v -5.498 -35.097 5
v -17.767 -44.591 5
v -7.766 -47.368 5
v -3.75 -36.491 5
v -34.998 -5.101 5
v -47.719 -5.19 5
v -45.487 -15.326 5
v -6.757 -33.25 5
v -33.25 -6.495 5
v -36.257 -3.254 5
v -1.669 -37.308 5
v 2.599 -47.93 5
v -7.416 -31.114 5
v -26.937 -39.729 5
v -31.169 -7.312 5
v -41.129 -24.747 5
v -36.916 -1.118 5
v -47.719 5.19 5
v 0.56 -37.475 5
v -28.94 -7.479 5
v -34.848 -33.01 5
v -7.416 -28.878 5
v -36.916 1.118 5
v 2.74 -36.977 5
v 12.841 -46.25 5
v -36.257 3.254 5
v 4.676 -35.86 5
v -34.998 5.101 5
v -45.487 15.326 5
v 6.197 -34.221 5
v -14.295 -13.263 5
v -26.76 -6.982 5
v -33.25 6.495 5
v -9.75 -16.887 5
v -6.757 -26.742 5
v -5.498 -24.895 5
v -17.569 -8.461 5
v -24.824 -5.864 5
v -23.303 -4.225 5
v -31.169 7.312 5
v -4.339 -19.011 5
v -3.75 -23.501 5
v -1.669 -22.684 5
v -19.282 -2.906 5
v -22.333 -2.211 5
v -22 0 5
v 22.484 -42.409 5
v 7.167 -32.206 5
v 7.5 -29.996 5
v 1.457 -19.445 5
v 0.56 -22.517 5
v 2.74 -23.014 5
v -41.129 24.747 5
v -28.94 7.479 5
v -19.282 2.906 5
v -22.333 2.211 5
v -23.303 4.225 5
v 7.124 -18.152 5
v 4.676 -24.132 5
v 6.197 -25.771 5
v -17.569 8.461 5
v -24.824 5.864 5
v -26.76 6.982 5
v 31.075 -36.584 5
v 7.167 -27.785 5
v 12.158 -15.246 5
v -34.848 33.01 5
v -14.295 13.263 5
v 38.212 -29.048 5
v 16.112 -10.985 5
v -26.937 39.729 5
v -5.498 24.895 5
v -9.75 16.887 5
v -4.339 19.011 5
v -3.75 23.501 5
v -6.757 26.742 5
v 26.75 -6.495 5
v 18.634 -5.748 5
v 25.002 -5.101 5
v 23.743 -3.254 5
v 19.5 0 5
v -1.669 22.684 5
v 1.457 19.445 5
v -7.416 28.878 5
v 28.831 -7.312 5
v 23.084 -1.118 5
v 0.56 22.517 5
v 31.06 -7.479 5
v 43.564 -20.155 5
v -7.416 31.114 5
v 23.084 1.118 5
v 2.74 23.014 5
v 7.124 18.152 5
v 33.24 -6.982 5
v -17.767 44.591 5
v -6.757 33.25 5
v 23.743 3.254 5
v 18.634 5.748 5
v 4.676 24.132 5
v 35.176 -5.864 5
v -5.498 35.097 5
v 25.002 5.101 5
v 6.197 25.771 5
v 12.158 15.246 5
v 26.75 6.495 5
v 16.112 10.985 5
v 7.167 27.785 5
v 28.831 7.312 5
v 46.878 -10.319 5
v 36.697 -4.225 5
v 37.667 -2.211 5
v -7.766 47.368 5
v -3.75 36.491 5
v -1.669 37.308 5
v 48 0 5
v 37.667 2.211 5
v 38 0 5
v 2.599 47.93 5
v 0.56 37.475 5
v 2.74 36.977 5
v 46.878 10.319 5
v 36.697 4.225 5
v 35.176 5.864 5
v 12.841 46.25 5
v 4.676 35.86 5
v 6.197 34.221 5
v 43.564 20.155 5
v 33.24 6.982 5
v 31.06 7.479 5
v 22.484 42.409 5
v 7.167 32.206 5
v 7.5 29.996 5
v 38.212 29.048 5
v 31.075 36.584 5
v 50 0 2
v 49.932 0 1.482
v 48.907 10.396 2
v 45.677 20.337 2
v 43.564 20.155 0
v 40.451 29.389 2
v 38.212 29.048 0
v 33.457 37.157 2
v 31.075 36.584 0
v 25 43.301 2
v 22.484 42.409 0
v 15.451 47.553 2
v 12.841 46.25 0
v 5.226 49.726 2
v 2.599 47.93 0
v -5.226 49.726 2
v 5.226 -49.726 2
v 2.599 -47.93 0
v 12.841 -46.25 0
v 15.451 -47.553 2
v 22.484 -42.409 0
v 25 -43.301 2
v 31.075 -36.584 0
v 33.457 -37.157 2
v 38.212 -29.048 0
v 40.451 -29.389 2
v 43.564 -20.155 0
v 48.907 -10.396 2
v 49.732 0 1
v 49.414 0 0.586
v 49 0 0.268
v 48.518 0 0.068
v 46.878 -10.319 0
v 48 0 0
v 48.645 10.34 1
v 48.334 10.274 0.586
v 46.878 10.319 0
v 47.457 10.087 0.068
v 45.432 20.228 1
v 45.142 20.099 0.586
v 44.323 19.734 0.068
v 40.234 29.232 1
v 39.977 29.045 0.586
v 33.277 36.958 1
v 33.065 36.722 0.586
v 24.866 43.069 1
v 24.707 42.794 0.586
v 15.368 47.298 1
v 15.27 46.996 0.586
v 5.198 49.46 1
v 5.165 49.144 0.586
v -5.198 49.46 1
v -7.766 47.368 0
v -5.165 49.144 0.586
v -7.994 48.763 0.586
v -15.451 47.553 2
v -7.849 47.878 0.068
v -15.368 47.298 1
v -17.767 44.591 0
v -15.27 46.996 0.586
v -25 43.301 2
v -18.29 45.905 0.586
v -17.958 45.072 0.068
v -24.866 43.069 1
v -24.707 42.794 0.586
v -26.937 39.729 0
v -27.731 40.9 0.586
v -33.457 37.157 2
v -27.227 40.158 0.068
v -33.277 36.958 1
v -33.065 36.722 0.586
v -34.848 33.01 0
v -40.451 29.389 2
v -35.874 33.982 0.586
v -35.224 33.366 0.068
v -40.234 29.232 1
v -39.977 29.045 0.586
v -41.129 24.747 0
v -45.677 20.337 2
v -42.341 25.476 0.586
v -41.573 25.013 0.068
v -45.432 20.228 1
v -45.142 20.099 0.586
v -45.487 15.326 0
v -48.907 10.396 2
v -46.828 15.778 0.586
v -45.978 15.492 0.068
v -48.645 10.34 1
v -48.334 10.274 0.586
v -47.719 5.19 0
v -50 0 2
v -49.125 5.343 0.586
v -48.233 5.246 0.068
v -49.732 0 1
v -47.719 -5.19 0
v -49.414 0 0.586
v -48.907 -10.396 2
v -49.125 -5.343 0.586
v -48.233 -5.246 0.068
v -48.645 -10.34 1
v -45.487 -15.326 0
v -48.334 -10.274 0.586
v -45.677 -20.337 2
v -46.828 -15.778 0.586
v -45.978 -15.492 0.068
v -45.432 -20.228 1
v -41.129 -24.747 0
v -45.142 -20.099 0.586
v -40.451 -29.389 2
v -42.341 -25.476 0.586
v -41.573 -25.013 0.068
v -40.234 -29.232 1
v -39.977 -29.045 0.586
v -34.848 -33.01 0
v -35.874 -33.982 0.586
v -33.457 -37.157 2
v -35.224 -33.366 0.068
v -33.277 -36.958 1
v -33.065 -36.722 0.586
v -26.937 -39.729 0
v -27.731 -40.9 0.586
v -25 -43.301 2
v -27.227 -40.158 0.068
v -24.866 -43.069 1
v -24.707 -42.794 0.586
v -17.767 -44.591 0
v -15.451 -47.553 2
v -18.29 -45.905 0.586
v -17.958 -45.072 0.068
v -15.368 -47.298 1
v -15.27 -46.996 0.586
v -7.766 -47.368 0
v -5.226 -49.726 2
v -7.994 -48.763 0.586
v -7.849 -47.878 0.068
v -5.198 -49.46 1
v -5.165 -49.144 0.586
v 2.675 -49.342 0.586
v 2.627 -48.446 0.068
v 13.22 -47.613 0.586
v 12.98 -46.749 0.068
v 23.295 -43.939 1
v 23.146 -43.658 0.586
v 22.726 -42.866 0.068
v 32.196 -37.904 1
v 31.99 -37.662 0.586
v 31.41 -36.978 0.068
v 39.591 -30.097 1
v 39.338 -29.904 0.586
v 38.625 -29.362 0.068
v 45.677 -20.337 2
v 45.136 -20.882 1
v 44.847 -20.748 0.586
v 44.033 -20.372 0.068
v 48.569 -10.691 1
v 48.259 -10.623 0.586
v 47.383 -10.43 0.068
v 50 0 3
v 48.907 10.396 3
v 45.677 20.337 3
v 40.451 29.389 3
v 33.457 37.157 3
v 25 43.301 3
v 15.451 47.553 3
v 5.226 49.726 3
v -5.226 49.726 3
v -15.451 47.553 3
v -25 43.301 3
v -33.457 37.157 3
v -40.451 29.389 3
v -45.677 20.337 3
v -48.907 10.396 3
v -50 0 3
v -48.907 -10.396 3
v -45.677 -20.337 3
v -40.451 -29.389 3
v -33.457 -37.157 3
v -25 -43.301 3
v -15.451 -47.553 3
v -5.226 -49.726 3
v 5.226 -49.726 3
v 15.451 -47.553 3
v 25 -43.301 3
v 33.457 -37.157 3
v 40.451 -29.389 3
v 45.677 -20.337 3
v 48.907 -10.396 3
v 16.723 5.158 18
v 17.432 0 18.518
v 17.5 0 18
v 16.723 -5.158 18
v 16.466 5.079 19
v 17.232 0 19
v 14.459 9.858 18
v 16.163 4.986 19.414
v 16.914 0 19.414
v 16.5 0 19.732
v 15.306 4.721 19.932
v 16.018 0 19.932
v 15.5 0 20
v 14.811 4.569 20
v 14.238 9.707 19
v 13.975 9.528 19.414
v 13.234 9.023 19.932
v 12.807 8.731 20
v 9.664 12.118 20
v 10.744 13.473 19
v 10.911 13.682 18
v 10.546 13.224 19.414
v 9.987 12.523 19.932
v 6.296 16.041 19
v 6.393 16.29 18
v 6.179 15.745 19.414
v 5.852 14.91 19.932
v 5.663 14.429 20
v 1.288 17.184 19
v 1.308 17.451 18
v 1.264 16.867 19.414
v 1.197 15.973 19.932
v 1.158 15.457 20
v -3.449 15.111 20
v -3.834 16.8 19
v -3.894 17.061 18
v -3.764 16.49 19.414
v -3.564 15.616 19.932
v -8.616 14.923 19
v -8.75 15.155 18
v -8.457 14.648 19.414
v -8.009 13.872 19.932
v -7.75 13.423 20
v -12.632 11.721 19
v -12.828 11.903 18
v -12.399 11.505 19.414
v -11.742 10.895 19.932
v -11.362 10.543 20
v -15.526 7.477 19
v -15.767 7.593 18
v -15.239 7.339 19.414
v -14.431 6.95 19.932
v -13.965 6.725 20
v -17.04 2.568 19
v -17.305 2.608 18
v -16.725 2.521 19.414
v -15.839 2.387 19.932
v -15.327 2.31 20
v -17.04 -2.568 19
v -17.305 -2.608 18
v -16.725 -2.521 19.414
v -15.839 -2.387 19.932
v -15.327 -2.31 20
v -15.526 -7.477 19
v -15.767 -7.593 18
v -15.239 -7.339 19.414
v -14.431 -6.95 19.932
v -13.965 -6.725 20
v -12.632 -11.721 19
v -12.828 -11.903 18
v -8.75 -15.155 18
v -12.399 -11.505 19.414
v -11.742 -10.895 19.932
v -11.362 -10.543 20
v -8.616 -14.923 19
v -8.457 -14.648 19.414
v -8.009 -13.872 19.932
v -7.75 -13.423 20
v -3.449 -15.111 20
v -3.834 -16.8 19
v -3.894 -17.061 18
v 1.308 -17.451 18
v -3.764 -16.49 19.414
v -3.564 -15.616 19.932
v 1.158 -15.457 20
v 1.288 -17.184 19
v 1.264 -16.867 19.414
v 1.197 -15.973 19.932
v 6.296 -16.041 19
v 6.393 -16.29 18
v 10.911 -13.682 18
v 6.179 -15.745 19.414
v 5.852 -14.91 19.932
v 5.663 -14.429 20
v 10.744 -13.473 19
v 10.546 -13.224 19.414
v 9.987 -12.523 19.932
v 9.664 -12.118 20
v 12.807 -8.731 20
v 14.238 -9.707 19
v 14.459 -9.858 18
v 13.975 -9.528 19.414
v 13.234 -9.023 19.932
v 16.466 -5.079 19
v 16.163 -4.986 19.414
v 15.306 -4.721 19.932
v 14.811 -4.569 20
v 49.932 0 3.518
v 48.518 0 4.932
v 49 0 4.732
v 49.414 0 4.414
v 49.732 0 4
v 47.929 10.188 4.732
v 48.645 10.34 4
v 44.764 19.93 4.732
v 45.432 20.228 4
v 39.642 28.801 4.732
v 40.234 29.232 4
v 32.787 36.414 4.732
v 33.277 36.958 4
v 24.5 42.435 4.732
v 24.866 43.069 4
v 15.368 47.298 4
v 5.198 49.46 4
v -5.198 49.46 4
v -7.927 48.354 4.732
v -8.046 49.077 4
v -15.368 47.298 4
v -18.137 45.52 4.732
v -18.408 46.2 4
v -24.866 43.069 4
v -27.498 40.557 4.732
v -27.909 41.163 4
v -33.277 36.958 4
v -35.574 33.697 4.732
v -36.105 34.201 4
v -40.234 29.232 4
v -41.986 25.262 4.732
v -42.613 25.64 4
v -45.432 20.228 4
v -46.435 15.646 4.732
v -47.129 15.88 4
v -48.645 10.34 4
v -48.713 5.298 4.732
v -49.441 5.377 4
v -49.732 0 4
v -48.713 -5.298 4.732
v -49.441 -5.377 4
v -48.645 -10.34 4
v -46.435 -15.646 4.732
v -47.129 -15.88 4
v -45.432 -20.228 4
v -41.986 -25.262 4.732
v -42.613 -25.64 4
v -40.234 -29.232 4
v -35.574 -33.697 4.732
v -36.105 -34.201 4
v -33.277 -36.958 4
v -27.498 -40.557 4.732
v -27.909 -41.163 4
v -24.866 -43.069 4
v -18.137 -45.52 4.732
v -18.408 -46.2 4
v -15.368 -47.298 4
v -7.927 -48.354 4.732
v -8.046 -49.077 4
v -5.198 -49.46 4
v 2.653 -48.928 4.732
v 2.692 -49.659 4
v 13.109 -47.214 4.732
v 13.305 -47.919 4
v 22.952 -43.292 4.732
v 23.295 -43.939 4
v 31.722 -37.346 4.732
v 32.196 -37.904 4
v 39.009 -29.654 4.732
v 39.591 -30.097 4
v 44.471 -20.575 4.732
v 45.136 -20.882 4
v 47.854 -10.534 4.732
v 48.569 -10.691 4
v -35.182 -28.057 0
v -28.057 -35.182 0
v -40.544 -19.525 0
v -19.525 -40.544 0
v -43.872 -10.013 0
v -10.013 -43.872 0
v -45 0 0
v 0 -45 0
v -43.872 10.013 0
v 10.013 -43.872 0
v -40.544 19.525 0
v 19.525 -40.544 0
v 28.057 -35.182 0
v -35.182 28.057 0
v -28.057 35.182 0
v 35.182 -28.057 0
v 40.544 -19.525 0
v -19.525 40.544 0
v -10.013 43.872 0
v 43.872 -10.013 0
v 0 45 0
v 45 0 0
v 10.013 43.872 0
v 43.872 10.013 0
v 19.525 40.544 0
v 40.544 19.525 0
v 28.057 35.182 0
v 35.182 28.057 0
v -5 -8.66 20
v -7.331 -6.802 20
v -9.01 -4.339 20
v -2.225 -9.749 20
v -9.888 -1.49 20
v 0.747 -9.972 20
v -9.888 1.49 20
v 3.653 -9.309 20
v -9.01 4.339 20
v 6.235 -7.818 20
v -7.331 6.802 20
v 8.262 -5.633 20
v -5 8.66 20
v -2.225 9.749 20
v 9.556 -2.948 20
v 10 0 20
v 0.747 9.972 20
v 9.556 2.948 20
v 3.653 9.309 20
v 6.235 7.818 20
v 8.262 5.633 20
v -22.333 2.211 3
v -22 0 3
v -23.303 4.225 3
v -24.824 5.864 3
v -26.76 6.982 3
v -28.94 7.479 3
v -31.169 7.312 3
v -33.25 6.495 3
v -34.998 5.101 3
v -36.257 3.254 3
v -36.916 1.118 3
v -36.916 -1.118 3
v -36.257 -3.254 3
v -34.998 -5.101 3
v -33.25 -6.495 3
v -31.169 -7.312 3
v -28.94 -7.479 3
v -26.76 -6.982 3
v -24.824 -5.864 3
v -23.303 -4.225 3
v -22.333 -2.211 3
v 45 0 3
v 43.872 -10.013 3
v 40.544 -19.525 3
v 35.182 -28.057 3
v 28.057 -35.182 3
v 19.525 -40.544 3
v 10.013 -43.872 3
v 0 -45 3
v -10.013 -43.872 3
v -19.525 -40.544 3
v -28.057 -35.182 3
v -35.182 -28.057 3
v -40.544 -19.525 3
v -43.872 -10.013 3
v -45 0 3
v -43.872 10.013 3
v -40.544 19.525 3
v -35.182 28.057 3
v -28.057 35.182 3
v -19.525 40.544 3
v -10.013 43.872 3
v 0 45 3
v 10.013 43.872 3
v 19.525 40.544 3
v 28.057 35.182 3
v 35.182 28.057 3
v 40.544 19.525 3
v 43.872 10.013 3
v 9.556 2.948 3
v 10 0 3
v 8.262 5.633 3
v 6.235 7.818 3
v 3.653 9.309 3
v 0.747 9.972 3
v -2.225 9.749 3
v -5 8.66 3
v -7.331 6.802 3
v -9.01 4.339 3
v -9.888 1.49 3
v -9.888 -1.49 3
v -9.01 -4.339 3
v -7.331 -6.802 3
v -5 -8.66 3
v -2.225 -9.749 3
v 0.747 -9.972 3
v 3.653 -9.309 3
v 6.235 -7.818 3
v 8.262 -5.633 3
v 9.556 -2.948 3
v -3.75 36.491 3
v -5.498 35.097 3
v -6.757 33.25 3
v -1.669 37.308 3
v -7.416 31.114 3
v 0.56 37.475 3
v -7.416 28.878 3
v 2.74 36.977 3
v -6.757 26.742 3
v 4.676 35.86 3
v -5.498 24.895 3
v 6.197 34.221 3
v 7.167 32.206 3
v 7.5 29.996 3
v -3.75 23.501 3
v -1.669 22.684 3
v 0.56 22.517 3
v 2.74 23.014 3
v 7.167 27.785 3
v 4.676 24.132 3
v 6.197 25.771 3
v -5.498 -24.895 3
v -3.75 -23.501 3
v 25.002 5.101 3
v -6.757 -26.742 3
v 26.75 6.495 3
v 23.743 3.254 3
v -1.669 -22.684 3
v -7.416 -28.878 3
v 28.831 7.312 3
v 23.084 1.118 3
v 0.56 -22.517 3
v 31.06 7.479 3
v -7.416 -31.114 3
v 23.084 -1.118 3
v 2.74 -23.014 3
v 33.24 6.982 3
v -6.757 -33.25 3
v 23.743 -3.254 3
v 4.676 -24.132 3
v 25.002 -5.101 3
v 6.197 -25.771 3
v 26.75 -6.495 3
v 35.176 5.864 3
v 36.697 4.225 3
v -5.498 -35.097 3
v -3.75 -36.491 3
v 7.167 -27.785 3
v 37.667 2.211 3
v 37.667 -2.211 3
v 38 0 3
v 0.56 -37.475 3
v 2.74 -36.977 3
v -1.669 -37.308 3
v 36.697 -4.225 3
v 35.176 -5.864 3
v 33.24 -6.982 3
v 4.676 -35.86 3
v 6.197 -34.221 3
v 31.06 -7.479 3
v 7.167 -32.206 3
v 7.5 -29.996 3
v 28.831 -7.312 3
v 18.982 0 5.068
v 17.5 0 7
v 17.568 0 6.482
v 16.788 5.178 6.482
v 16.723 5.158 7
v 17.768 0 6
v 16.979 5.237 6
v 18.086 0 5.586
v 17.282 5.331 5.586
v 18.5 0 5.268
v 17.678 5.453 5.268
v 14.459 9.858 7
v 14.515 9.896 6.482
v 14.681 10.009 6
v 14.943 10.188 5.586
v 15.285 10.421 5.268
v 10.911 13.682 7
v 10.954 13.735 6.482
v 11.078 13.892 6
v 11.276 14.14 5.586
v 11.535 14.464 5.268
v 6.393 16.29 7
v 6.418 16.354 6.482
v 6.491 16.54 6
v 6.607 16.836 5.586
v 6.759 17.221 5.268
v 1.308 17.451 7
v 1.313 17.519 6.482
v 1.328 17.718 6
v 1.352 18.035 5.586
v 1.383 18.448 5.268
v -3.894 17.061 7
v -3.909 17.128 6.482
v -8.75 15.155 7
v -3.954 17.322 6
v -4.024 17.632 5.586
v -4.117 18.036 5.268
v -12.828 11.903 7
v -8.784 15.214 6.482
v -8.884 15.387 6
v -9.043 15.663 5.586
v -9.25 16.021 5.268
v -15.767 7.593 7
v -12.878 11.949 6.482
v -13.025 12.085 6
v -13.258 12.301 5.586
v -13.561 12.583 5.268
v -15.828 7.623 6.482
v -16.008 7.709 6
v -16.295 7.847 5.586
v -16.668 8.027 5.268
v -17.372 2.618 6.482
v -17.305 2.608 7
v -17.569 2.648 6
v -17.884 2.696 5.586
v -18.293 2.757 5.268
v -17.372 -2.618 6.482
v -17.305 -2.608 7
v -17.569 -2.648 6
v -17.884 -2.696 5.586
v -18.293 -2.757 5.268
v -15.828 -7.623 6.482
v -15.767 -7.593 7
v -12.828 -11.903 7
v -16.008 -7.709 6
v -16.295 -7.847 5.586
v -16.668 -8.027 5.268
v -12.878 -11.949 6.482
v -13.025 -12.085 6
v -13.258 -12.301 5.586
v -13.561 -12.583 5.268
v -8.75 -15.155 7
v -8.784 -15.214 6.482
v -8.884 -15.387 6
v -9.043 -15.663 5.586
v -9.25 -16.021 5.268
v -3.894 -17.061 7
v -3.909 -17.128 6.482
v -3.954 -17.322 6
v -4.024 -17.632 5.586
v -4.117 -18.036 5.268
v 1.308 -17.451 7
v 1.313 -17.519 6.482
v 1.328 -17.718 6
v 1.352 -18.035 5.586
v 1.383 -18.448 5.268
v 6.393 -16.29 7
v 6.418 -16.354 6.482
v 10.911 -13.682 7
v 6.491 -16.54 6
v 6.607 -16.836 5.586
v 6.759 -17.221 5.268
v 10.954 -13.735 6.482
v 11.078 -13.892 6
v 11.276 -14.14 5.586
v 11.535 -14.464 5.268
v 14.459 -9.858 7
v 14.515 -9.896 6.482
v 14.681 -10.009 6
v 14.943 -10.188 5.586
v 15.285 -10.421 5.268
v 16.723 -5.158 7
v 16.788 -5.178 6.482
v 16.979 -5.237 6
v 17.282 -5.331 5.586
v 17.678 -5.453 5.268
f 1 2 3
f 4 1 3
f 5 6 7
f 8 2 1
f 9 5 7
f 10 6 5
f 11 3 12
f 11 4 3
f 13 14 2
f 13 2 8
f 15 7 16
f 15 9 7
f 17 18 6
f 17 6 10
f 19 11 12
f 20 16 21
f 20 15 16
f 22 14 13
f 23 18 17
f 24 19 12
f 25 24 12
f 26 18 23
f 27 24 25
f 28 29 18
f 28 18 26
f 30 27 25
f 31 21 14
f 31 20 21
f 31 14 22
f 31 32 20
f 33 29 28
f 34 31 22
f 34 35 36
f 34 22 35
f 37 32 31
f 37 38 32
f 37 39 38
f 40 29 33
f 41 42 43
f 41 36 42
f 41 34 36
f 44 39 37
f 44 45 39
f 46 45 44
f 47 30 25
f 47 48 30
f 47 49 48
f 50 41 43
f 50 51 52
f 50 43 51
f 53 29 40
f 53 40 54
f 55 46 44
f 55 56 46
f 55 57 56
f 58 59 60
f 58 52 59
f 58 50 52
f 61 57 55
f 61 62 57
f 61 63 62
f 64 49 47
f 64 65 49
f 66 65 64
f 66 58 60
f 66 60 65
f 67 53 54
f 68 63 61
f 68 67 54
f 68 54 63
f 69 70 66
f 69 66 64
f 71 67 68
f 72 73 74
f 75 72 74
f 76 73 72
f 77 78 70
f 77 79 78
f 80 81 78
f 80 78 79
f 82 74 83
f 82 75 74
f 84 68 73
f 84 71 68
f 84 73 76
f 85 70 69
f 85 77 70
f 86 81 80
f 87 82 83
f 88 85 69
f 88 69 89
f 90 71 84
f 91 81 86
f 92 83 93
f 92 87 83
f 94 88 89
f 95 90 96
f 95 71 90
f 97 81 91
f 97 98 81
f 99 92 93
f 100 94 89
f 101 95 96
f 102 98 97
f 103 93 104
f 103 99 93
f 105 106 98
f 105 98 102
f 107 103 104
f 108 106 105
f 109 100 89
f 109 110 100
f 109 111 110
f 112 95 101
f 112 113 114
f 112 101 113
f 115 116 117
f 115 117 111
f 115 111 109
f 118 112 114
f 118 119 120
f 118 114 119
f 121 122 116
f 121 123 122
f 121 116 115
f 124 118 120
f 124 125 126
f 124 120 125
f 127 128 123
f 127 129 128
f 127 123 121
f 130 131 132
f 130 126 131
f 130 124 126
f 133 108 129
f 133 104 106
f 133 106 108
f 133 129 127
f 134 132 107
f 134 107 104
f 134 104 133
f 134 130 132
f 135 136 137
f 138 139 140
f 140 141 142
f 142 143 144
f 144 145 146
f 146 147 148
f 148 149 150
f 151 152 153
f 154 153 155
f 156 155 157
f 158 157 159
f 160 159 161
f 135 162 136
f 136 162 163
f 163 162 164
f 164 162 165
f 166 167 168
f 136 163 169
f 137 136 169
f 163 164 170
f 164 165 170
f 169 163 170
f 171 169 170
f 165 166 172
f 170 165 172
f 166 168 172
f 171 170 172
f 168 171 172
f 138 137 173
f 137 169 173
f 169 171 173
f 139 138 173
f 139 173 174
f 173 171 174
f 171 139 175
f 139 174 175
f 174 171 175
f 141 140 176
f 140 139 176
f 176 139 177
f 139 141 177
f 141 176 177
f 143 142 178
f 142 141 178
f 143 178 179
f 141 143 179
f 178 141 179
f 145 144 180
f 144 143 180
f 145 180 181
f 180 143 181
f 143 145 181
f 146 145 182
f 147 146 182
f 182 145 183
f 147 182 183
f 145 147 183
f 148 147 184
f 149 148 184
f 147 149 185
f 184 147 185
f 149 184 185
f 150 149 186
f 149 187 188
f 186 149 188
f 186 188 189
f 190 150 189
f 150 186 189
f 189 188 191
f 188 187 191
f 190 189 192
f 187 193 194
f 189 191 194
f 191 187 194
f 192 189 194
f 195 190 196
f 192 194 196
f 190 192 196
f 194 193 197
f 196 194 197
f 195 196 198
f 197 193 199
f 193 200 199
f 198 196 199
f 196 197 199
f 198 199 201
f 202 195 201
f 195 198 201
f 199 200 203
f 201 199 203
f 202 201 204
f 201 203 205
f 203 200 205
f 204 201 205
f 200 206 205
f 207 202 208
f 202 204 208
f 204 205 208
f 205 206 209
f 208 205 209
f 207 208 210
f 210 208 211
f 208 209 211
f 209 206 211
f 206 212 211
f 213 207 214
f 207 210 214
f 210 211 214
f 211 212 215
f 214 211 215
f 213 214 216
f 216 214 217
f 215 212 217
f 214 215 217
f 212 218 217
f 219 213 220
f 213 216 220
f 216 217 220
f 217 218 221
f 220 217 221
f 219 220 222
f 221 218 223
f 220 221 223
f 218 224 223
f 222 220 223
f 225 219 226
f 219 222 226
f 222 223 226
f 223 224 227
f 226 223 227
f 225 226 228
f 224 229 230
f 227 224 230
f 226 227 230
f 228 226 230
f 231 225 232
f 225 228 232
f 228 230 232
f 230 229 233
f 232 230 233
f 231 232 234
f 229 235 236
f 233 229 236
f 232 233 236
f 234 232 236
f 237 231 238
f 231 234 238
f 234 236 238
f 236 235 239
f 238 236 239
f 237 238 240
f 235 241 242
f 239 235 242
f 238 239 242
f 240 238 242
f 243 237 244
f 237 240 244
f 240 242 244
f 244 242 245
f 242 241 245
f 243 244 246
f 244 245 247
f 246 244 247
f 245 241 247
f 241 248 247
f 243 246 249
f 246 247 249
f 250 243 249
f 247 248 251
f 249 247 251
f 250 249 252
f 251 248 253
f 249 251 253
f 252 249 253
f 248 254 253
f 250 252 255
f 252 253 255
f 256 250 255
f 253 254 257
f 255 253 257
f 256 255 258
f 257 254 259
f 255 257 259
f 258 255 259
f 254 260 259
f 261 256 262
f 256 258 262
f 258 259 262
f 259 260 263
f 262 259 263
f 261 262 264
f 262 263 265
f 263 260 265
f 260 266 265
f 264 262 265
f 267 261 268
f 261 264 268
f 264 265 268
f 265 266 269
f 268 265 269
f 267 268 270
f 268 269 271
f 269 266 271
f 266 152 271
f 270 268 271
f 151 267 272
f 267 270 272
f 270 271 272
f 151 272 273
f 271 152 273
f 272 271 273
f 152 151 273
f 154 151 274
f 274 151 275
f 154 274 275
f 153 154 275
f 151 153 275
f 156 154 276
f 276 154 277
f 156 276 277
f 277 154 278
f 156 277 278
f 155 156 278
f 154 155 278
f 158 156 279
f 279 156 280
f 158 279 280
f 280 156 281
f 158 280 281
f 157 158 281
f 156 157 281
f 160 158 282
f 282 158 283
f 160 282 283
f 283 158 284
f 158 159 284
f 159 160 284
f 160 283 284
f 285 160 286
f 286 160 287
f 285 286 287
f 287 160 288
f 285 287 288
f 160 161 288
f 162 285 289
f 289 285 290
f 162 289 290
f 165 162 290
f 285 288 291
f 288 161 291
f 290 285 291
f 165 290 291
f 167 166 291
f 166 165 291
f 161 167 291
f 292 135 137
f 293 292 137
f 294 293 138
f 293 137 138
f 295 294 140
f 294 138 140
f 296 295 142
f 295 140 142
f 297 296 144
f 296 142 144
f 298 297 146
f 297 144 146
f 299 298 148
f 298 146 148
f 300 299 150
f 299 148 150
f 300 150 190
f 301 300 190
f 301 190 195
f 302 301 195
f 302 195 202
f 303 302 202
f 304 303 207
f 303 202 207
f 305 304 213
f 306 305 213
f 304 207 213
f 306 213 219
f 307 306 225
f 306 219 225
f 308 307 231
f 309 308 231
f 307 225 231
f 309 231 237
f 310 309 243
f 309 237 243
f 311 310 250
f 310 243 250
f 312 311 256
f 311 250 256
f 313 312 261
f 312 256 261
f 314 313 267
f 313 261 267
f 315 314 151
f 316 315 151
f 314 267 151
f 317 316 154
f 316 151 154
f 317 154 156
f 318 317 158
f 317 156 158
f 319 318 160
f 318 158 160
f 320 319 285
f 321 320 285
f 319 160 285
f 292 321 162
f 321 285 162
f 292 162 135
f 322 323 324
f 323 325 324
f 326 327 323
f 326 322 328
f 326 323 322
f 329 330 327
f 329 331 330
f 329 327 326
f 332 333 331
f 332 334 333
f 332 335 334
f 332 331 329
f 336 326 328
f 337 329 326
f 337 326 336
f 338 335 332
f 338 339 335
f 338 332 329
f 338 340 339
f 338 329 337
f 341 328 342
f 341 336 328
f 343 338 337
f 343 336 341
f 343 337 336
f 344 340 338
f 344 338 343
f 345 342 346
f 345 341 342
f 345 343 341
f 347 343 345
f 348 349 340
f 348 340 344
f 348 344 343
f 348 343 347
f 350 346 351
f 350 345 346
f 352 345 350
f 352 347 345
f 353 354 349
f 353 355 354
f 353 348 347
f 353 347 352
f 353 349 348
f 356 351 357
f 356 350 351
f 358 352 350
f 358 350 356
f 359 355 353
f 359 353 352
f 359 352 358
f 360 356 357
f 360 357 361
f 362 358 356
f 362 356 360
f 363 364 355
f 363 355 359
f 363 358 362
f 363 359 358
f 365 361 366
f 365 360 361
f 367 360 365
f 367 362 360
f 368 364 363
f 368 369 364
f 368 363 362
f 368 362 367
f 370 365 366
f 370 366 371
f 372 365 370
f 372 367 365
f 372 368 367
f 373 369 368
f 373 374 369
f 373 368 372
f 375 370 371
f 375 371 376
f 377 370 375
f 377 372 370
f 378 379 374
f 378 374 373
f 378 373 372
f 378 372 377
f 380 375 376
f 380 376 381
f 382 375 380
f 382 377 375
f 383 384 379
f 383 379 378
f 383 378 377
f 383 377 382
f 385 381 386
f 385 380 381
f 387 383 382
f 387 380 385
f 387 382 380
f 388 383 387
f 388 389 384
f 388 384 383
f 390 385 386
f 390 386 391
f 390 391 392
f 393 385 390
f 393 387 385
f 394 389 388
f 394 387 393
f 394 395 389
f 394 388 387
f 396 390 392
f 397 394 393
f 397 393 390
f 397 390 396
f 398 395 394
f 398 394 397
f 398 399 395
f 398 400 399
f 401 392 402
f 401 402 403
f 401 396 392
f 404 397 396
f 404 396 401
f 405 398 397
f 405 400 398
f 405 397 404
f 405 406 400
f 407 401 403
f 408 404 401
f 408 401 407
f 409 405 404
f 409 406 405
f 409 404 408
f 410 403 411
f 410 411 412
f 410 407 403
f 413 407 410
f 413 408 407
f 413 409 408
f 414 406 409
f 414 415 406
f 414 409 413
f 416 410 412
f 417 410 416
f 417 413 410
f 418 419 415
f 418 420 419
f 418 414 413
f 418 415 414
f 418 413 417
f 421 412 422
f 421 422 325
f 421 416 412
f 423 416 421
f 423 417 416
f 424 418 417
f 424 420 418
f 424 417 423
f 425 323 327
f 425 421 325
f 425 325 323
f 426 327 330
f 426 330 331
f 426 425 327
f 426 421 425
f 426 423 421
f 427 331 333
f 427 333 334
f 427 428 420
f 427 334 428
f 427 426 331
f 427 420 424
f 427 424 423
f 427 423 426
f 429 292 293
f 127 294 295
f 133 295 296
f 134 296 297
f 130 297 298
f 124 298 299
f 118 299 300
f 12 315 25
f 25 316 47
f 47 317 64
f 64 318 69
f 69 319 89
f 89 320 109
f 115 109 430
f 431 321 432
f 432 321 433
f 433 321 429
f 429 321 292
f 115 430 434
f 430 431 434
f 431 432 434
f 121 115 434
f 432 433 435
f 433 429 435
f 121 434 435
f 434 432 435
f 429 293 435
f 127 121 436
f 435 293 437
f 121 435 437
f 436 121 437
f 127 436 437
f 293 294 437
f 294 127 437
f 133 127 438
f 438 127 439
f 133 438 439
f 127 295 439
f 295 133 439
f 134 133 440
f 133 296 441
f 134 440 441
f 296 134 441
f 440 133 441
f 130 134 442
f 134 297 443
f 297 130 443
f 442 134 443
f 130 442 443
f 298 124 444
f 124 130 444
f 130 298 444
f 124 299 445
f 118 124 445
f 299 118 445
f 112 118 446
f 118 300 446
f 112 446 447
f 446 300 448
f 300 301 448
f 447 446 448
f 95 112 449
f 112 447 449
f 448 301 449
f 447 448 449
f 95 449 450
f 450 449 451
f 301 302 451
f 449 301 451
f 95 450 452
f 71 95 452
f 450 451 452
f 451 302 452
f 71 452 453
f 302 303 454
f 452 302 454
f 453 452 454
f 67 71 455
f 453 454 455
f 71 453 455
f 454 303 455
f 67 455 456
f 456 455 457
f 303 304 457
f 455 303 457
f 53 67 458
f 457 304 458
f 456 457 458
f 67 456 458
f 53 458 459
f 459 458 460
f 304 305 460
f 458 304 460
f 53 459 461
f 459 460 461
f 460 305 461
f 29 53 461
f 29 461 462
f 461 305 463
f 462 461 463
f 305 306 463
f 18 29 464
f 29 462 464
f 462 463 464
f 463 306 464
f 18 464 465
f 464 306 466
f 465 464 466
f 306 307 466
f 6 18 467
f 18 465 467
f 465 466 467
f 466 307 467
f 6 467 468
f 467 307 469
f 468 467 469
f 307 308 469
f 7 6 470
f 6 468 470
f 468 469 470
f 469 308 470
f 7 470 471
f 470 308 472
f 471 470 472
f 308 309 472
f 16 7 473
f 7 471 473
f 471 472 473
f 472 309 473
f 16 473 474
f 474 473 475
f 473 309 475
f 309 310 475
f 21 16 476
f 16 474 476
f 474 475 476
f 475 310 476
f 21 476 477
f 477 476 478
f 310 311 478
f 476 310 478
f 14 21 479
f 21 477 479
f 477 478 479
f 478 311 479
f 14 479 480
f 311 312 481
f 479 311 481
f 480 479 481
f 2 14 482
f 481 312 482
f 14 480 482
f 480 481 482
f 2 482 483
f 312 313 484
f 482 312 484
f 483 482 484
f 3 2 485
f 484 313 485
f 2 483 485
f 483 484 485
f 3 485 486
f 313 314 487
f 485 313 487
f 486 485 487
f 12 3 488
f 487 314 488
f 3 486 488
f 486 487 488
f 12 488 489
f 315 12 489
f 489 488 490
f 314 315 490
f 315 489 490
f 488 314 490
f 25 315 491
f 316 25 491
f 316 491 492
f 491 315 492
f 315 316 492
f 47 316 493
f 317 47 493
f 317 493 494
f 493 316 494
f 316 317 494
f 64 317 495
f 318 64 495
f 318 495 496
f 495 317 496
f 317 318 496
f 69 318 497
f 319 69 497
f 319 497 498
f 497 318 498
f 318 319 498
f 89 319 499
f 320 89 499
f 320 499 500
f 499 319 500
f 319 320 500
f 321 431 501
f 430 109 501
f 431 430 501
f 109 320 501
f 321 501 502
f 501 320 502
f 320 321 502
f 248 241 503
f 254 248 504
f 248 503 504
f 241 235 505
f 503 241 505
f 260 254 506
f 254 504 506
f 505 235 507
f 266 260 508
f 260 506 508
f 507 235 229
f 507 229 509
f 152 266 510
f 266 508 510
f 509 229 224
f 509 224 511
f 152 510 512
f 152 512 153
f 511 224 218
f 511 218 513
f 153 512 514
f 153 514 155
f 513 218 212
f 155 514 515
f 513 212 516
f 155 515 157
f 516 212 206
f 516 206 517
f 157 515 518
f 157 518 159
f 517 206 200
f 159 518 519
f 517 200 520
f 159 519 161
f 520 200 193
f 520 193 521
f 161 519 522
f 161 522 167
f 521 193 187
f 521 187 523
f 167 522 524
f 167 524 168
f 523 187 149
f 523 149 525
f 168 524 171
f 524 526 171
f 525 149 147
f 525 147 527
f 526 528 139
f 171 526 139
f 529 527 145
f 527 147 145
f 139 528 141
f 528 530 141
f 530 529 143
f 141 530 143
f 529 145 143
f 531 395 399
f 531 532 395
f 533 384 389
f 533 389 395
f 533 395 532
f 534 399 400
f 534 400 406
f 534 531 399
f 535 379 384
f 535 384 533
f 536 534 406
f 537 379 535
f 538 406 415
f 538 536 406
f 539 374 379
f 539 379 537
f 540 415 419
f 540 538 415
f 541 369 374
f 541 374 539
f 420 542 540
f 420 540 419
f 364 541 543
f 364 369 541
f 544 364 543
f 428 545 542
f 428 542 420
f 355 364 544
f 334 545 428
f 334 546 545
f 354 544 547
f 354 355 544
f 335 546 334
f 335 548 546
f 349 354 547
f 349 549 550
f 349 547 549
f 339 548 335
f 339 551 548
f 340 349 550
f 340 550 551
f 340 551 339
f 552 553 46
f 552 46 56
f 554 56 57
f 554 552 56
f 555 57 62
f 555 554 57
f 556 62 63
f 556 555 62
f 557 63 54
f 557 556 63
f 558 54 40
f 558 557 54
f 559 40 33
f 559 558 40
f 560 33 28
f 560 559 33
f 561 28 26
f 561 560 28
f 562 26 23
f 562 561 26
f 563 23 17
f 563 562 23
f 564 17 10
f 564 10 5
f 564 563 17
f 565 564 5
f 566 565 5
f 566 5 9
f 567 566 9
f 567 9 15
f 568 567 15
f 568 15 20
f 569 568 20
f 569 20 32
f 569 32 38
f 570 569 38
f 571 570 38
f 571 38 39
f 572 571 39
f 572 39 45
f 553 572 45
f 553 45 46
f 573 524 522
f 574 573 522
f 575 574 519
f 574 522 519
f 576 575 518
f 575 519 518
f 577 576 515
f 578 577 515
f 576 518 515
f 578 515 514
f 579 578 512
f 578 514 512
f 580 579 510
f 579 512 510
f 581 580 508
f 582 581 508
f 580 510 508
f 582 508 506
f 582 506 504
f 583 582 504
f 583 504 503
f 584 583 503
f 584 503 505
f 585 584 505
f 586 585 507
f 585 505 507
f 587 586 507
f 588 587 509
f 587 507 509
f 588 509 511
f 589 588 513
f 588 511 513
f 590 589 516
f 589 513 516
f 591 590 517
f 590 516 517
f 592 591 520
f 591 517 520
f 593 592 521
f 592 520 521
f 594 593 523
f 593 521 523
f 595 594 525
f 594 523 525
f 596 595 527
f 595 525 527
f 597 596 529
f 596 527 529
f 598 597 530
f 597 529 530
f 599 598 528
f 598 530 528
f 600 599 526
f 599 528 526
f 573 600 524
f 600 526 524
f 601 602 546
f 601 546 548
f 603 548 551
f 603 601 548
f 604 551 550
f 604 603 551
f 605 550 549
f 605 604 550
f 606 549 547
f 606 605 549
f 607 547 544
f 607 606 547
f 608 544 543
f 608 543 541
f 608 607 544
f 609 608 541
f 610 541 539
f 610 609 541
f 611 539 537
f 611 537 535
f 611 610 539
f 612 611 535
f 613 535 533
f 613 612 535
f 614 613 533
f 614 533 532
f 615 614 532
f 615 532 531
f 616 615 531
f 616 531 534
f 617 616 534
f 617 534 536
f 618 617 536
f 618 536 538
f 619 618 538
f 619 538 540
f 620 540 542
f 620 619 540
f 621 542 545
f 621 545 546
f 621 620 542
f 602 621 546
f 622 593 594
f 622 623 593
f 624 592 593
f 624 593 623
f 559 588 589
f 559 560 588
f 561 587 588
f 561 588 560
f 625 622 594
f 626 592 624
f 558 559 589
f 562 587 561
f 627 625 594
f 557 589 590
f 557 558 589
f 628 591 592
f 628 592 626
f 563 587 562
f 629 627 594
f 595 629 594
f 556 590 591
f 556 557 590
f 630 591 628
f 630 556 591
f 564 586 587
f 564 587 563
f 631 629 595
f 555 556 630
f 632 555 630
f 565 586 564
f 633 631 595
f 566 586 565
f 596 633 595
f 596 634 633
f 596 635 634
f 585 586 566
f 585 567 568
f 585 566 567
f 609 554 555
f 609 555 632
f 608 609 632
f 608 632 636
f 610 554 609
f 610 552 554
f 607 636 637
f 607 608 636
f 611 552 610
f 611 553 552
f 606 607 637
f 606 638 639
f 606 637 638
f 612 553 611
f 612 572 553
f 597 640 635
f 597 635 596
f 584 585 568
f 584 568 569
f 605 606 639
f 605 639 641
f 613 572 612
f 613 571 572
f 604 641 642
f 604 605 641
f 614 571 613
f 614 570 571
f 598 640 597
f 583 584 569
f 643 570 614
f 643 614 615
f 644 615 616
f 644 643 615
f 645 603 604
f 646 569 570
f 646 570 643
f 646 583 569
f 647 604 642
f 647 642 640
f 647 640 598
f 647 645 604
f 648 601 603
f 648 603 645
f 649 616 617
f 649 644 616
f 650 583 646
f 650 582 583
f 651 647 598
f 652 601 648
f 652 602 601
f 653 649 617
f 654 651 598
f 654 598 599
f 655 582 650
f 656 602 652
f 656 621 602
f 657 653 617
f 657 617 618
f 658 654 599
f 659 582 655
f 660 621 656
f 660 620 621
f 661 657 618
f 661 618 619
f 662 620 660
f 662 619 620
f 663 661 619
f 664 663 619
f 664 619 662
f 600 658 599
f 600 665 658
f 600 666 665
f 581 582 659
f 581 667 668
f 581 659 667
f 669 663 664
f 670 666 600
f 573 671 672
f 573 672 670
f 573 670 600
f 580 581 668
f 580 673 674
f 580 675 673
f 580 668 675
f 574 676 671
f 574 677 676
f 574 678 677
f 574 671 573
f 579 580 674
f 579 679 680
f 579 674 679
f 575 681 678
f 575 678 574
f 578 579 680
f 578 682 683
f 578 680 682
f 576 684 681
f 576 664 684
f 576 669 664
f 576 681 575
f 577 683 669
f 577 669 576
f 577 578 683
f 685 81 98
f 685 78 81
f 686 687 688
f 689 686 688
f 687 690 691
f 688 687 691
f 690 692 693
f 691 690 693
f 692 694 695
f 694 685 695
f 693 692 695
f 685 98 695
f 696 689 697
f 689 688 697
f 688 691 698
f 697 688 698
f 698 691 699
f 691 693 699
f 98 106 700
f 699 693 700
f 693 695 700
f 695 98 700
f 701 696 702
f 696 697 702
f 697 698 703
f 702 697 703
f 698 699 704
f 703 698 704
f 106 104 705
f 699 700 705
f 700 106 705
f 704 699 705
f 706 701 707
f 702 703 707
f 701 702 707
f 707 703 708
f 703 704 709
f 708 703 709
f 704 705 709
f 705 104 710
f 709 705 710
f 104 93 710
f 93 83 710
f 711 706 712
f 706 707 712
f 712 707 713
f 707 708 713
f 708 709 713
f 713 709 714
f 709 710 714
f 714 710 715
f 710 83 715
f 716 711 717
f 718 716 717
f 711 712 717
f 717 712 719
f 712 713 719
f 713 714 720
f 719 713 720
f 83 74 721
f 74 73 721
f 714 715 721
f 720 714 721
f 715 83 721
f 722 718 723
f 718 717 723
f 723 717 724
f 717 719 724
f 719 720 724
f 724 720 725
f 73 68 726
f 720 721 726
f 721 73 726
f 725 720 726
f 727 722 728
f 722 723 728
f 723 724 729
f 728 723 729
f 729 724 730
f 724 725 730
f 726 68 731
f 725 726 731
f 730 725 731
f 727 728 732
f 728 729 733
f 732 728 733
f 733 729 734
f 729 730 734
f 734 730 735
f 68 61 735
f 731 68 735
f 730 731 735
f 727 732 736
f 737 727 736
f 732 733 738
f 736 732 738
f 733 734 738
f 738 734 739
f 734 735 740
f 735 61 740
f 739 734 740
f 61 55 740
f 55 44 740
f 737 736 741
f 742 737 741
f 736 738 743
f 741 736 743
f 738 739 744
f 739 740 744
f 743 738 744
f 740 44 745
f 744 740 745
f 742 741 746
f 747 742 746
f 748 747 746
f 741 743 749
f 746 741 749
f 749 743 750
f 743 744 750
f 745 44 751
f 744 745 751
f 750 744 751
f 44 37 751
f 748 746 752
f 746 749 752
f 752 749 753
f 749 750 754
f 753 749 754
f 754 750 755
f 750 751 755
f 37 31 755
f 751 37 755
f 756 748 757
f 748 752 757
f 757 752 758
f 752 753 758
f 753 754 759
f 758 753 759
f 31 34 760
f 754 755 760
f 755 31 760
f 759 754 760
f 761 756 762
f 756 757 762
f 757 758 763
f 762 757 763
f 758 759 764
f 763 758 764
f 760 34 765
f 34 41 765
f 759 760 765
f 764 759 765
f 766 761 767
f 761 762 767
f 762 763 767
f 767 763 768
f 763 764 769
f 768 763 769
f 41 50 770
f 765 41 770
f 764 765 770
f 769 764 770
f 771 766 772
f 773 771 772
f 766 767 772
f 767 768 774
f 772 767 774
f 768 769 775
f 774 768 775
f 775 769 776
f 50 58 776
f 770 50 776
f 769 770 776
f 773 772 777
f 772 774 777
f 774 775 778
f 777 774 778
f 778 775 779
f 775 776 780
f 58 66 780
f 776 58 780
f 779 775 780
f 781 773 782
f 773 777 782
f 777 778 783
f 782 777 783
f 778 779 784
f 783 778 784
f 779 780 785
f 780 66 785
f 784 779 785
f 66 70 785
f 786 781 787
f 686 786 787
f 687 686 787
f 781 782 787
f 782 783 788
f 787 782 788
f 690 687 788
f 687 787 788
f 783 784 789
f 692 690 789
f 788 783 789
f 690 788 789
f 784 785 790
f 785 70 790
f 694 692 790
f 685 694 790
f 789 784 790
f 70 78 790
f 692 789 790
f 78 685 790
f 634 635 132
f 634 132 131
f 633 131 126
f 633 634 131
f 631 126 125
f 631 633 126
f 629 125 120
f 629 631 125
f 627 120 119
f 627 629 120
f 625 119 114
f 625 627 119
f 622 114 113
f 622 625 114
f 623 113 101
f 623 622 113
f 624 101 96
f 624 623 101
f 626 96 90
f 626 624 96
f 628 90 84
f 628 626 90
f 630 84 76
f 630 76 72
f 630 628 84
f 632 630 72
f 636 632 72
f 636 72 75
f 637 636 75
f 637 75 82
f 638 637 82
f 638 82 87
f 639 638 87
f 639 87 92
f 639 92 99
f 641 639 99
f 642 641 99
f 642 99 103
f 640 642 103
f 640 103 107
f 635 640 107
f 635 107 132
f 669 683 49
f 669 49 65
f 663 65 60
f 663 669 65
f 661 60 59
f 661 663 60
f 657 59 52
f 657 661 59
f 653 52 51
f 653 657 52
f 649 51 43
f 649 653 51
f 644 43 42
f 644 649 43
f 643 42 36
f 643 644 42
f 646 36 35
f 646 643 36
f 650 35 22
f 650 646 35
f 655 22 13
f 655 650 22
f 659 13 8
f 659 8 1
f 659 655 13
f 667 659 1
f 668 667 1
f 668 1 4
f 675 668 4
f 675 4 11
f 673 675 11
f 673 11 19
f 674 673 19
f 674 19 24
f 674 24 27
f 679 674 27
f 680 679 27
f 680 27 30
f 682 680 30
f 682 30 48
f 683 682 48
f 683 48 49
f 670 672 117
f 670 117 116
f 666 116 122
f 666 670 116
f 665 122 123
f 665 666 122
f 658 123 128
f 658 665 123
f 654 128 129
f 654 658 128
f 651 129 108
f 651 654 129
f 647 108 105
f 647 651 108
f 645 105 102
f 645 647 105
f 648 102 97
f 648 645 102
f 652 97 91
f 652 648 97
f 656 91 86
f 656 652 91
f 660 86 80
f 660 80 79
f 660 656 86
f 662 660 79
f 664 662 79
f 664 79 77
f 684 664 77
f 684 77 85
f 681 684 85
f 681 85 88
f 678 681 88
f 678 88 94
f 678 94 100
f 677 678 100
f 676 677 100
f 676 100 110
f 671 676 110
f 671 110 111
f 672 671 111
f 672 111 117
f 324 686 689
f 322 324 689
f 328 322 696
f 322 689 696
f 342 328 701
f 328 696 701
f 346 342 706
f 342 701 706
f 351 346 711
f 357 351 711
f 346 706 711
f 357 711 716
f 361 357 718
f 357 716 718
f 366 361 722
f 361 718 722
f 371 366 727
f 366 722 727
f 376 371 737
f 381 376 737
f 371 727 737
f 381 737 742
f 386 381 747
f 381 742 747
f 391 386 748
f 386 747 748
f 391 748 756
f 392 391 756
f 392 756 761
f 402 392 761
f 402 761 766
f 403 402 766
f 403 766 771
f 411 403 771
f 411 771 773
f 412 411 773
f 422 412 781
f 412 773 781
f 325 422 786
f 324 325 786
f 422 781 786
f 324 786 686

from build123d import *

# Parameters (mm, degrees)
SKETCH_R      = 50
SKETCH_R_2    = 7.5
SKETCH_R_3    = 10
PAD_DEPTH     = 5
SKETCH001_R   = 17.5
SKETCH001_R_2 = 10
PAD001_DEPTH  = 15
SKETCH002_R   = 45
POCKET_DEPTH  = 3
FILLET_R      = 2


with BuildPart() as part:
    # Sketch (on XY_Plane of Origin) → Pad (new body)
    with BuildSketch(Plane.XY):
        Circle(SKETCH_R)
        with Locations((0, 29.995833)):
            Circle(SKETCH_R_2, mode=Mode.SUBTRACT)
        with Locations((-29.5, 0)):
            Circle(SKETCH_R_2, mode=Mode.SUBTRACT)
        with Locations((30.5, 0)):
            Circle(SKETCH_R_2, mode=Mode.SUBTRACT)
        with Locations((0, -29.995833)):
            Circle(SKETCH_R_2, mode=Mode.SUBTRACT)
        Circle(SKETCH_R_3, mode=Mode.SUBTRACT)
    extrude(amount=PAD_DEPTH)

    # Sketch001 (on Face8 of Pad) → Pad001 (join)
    with BuildSketch(Plane.XY.offset(5)):
        Circle(SKETCH001_R)
        Circle(SKETCH001_R_2, mode=Mode.SUBTRACT)
    extrude(amount=PAD001_DEPTH)

    # Sketch002 (on Face2 of Pad001) → Pocket (cut)
    with BuildSketch(Plane(origin=(0, 0, 0), x_dir=(1, 0, 0), z_dir=(0, 0, -1))):
        Circle(SKETCH002_R)
    extrude(amount=-POCKET_DEPTH, mode=Mode.SUBTRACT)

    # Fillet
    fillet_edges = [part.edges().sort_by_distance(p)[0] for p in [
        (-17.5, 0, 20),
        (-17.5, 0, 5),
        (-50, 0, 5),
        (-50, 0, 0),
    ]]
    fillet(fillet_edges, radius=FILLET_R)


solid = part.part
